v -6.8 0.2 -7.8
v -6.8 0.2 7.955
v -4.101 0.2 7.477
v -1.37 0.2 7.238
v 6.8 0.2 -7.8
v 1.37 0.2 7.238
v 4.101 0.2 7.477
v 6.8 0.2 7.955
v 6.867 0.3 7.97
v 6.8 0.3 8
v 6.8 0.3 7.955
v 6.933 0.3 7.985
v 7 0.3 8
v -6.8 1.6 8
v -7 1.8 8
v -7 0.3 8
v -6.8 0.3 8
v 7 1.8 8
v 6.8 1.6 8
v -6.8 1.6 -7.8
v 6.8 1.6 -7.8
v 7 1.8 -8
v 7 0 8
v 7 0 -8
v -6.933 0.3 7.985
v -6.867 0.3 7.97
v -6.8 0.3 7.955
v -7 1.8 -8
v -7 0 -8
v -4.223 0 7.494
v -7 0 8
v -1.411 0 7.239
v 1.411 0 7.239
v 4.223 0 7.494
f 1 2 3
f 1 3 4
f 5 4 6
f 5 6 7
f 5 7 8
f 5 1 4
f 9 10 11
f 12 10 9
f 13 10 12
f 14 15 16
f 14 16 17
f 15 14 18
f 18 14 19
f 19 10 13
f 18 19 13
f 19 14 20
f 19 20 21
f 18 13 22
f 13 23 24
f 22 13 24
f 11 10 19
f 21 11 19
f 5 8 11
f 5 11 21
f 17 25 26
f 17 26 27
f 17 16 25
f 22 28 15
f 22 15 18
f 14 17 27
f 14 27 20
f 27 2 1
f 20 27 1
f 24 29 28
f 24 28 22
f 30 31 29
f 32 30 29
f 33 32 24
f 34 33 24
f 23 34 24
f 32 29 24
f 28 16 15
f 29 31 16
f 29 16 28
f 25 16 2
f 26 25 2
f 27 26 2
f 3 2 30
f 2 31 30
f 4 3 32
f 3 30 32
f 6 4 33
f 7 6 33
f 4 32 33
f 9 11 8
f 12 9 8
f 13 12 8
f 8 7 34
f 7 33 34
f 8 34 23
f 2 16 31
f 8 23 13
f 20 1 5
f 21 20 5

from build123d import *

# Parameters (mm, degrees)
SKETCH_1_W          = 14
SKETCH_1_H          = 16
EXTRUDE_1_DEPTH     = 1.8
SHELL_1_T           = -0.2
CUT_EXTRUDE_2_DEPTH = 0.3


with BuildPart() as part:
    # 草图1 → 拉伸1 (new body)
    with BuildSketch(Plane(origin=(0, 0, 0), x_dir=(1, 0, 0), z_dir=(0, 1, 0))):
        Rectangle(SKETCH_1_W, SKETCH_1_H)
    extrude(amount=EXTRUDE_1_DEPTH)

    # 抽壳1
    shell_1_openings = [part.faces().sort_by_distance(p)[0] for p in [
        (0, 0.9, 8),
    ]]
    offset(amount=SHELL_1_T, openings=shell_1_openings, kind=Kind.INTERSECTION)

    # 草图2 → 切除-拉伸2 (cut)
    with BuildSketch(Plane.XZ):
        with BuildLine():
            Line((7, 8), (-7, 8))
            ThreePointArc((-7, 8), (0, 7.20758668), (7, 8))
        make_face()
    extrude(amount=-CUT_EXTRUDE_2_DEPTH, mode=Mode.SUBTRACT)


solid = part.part
